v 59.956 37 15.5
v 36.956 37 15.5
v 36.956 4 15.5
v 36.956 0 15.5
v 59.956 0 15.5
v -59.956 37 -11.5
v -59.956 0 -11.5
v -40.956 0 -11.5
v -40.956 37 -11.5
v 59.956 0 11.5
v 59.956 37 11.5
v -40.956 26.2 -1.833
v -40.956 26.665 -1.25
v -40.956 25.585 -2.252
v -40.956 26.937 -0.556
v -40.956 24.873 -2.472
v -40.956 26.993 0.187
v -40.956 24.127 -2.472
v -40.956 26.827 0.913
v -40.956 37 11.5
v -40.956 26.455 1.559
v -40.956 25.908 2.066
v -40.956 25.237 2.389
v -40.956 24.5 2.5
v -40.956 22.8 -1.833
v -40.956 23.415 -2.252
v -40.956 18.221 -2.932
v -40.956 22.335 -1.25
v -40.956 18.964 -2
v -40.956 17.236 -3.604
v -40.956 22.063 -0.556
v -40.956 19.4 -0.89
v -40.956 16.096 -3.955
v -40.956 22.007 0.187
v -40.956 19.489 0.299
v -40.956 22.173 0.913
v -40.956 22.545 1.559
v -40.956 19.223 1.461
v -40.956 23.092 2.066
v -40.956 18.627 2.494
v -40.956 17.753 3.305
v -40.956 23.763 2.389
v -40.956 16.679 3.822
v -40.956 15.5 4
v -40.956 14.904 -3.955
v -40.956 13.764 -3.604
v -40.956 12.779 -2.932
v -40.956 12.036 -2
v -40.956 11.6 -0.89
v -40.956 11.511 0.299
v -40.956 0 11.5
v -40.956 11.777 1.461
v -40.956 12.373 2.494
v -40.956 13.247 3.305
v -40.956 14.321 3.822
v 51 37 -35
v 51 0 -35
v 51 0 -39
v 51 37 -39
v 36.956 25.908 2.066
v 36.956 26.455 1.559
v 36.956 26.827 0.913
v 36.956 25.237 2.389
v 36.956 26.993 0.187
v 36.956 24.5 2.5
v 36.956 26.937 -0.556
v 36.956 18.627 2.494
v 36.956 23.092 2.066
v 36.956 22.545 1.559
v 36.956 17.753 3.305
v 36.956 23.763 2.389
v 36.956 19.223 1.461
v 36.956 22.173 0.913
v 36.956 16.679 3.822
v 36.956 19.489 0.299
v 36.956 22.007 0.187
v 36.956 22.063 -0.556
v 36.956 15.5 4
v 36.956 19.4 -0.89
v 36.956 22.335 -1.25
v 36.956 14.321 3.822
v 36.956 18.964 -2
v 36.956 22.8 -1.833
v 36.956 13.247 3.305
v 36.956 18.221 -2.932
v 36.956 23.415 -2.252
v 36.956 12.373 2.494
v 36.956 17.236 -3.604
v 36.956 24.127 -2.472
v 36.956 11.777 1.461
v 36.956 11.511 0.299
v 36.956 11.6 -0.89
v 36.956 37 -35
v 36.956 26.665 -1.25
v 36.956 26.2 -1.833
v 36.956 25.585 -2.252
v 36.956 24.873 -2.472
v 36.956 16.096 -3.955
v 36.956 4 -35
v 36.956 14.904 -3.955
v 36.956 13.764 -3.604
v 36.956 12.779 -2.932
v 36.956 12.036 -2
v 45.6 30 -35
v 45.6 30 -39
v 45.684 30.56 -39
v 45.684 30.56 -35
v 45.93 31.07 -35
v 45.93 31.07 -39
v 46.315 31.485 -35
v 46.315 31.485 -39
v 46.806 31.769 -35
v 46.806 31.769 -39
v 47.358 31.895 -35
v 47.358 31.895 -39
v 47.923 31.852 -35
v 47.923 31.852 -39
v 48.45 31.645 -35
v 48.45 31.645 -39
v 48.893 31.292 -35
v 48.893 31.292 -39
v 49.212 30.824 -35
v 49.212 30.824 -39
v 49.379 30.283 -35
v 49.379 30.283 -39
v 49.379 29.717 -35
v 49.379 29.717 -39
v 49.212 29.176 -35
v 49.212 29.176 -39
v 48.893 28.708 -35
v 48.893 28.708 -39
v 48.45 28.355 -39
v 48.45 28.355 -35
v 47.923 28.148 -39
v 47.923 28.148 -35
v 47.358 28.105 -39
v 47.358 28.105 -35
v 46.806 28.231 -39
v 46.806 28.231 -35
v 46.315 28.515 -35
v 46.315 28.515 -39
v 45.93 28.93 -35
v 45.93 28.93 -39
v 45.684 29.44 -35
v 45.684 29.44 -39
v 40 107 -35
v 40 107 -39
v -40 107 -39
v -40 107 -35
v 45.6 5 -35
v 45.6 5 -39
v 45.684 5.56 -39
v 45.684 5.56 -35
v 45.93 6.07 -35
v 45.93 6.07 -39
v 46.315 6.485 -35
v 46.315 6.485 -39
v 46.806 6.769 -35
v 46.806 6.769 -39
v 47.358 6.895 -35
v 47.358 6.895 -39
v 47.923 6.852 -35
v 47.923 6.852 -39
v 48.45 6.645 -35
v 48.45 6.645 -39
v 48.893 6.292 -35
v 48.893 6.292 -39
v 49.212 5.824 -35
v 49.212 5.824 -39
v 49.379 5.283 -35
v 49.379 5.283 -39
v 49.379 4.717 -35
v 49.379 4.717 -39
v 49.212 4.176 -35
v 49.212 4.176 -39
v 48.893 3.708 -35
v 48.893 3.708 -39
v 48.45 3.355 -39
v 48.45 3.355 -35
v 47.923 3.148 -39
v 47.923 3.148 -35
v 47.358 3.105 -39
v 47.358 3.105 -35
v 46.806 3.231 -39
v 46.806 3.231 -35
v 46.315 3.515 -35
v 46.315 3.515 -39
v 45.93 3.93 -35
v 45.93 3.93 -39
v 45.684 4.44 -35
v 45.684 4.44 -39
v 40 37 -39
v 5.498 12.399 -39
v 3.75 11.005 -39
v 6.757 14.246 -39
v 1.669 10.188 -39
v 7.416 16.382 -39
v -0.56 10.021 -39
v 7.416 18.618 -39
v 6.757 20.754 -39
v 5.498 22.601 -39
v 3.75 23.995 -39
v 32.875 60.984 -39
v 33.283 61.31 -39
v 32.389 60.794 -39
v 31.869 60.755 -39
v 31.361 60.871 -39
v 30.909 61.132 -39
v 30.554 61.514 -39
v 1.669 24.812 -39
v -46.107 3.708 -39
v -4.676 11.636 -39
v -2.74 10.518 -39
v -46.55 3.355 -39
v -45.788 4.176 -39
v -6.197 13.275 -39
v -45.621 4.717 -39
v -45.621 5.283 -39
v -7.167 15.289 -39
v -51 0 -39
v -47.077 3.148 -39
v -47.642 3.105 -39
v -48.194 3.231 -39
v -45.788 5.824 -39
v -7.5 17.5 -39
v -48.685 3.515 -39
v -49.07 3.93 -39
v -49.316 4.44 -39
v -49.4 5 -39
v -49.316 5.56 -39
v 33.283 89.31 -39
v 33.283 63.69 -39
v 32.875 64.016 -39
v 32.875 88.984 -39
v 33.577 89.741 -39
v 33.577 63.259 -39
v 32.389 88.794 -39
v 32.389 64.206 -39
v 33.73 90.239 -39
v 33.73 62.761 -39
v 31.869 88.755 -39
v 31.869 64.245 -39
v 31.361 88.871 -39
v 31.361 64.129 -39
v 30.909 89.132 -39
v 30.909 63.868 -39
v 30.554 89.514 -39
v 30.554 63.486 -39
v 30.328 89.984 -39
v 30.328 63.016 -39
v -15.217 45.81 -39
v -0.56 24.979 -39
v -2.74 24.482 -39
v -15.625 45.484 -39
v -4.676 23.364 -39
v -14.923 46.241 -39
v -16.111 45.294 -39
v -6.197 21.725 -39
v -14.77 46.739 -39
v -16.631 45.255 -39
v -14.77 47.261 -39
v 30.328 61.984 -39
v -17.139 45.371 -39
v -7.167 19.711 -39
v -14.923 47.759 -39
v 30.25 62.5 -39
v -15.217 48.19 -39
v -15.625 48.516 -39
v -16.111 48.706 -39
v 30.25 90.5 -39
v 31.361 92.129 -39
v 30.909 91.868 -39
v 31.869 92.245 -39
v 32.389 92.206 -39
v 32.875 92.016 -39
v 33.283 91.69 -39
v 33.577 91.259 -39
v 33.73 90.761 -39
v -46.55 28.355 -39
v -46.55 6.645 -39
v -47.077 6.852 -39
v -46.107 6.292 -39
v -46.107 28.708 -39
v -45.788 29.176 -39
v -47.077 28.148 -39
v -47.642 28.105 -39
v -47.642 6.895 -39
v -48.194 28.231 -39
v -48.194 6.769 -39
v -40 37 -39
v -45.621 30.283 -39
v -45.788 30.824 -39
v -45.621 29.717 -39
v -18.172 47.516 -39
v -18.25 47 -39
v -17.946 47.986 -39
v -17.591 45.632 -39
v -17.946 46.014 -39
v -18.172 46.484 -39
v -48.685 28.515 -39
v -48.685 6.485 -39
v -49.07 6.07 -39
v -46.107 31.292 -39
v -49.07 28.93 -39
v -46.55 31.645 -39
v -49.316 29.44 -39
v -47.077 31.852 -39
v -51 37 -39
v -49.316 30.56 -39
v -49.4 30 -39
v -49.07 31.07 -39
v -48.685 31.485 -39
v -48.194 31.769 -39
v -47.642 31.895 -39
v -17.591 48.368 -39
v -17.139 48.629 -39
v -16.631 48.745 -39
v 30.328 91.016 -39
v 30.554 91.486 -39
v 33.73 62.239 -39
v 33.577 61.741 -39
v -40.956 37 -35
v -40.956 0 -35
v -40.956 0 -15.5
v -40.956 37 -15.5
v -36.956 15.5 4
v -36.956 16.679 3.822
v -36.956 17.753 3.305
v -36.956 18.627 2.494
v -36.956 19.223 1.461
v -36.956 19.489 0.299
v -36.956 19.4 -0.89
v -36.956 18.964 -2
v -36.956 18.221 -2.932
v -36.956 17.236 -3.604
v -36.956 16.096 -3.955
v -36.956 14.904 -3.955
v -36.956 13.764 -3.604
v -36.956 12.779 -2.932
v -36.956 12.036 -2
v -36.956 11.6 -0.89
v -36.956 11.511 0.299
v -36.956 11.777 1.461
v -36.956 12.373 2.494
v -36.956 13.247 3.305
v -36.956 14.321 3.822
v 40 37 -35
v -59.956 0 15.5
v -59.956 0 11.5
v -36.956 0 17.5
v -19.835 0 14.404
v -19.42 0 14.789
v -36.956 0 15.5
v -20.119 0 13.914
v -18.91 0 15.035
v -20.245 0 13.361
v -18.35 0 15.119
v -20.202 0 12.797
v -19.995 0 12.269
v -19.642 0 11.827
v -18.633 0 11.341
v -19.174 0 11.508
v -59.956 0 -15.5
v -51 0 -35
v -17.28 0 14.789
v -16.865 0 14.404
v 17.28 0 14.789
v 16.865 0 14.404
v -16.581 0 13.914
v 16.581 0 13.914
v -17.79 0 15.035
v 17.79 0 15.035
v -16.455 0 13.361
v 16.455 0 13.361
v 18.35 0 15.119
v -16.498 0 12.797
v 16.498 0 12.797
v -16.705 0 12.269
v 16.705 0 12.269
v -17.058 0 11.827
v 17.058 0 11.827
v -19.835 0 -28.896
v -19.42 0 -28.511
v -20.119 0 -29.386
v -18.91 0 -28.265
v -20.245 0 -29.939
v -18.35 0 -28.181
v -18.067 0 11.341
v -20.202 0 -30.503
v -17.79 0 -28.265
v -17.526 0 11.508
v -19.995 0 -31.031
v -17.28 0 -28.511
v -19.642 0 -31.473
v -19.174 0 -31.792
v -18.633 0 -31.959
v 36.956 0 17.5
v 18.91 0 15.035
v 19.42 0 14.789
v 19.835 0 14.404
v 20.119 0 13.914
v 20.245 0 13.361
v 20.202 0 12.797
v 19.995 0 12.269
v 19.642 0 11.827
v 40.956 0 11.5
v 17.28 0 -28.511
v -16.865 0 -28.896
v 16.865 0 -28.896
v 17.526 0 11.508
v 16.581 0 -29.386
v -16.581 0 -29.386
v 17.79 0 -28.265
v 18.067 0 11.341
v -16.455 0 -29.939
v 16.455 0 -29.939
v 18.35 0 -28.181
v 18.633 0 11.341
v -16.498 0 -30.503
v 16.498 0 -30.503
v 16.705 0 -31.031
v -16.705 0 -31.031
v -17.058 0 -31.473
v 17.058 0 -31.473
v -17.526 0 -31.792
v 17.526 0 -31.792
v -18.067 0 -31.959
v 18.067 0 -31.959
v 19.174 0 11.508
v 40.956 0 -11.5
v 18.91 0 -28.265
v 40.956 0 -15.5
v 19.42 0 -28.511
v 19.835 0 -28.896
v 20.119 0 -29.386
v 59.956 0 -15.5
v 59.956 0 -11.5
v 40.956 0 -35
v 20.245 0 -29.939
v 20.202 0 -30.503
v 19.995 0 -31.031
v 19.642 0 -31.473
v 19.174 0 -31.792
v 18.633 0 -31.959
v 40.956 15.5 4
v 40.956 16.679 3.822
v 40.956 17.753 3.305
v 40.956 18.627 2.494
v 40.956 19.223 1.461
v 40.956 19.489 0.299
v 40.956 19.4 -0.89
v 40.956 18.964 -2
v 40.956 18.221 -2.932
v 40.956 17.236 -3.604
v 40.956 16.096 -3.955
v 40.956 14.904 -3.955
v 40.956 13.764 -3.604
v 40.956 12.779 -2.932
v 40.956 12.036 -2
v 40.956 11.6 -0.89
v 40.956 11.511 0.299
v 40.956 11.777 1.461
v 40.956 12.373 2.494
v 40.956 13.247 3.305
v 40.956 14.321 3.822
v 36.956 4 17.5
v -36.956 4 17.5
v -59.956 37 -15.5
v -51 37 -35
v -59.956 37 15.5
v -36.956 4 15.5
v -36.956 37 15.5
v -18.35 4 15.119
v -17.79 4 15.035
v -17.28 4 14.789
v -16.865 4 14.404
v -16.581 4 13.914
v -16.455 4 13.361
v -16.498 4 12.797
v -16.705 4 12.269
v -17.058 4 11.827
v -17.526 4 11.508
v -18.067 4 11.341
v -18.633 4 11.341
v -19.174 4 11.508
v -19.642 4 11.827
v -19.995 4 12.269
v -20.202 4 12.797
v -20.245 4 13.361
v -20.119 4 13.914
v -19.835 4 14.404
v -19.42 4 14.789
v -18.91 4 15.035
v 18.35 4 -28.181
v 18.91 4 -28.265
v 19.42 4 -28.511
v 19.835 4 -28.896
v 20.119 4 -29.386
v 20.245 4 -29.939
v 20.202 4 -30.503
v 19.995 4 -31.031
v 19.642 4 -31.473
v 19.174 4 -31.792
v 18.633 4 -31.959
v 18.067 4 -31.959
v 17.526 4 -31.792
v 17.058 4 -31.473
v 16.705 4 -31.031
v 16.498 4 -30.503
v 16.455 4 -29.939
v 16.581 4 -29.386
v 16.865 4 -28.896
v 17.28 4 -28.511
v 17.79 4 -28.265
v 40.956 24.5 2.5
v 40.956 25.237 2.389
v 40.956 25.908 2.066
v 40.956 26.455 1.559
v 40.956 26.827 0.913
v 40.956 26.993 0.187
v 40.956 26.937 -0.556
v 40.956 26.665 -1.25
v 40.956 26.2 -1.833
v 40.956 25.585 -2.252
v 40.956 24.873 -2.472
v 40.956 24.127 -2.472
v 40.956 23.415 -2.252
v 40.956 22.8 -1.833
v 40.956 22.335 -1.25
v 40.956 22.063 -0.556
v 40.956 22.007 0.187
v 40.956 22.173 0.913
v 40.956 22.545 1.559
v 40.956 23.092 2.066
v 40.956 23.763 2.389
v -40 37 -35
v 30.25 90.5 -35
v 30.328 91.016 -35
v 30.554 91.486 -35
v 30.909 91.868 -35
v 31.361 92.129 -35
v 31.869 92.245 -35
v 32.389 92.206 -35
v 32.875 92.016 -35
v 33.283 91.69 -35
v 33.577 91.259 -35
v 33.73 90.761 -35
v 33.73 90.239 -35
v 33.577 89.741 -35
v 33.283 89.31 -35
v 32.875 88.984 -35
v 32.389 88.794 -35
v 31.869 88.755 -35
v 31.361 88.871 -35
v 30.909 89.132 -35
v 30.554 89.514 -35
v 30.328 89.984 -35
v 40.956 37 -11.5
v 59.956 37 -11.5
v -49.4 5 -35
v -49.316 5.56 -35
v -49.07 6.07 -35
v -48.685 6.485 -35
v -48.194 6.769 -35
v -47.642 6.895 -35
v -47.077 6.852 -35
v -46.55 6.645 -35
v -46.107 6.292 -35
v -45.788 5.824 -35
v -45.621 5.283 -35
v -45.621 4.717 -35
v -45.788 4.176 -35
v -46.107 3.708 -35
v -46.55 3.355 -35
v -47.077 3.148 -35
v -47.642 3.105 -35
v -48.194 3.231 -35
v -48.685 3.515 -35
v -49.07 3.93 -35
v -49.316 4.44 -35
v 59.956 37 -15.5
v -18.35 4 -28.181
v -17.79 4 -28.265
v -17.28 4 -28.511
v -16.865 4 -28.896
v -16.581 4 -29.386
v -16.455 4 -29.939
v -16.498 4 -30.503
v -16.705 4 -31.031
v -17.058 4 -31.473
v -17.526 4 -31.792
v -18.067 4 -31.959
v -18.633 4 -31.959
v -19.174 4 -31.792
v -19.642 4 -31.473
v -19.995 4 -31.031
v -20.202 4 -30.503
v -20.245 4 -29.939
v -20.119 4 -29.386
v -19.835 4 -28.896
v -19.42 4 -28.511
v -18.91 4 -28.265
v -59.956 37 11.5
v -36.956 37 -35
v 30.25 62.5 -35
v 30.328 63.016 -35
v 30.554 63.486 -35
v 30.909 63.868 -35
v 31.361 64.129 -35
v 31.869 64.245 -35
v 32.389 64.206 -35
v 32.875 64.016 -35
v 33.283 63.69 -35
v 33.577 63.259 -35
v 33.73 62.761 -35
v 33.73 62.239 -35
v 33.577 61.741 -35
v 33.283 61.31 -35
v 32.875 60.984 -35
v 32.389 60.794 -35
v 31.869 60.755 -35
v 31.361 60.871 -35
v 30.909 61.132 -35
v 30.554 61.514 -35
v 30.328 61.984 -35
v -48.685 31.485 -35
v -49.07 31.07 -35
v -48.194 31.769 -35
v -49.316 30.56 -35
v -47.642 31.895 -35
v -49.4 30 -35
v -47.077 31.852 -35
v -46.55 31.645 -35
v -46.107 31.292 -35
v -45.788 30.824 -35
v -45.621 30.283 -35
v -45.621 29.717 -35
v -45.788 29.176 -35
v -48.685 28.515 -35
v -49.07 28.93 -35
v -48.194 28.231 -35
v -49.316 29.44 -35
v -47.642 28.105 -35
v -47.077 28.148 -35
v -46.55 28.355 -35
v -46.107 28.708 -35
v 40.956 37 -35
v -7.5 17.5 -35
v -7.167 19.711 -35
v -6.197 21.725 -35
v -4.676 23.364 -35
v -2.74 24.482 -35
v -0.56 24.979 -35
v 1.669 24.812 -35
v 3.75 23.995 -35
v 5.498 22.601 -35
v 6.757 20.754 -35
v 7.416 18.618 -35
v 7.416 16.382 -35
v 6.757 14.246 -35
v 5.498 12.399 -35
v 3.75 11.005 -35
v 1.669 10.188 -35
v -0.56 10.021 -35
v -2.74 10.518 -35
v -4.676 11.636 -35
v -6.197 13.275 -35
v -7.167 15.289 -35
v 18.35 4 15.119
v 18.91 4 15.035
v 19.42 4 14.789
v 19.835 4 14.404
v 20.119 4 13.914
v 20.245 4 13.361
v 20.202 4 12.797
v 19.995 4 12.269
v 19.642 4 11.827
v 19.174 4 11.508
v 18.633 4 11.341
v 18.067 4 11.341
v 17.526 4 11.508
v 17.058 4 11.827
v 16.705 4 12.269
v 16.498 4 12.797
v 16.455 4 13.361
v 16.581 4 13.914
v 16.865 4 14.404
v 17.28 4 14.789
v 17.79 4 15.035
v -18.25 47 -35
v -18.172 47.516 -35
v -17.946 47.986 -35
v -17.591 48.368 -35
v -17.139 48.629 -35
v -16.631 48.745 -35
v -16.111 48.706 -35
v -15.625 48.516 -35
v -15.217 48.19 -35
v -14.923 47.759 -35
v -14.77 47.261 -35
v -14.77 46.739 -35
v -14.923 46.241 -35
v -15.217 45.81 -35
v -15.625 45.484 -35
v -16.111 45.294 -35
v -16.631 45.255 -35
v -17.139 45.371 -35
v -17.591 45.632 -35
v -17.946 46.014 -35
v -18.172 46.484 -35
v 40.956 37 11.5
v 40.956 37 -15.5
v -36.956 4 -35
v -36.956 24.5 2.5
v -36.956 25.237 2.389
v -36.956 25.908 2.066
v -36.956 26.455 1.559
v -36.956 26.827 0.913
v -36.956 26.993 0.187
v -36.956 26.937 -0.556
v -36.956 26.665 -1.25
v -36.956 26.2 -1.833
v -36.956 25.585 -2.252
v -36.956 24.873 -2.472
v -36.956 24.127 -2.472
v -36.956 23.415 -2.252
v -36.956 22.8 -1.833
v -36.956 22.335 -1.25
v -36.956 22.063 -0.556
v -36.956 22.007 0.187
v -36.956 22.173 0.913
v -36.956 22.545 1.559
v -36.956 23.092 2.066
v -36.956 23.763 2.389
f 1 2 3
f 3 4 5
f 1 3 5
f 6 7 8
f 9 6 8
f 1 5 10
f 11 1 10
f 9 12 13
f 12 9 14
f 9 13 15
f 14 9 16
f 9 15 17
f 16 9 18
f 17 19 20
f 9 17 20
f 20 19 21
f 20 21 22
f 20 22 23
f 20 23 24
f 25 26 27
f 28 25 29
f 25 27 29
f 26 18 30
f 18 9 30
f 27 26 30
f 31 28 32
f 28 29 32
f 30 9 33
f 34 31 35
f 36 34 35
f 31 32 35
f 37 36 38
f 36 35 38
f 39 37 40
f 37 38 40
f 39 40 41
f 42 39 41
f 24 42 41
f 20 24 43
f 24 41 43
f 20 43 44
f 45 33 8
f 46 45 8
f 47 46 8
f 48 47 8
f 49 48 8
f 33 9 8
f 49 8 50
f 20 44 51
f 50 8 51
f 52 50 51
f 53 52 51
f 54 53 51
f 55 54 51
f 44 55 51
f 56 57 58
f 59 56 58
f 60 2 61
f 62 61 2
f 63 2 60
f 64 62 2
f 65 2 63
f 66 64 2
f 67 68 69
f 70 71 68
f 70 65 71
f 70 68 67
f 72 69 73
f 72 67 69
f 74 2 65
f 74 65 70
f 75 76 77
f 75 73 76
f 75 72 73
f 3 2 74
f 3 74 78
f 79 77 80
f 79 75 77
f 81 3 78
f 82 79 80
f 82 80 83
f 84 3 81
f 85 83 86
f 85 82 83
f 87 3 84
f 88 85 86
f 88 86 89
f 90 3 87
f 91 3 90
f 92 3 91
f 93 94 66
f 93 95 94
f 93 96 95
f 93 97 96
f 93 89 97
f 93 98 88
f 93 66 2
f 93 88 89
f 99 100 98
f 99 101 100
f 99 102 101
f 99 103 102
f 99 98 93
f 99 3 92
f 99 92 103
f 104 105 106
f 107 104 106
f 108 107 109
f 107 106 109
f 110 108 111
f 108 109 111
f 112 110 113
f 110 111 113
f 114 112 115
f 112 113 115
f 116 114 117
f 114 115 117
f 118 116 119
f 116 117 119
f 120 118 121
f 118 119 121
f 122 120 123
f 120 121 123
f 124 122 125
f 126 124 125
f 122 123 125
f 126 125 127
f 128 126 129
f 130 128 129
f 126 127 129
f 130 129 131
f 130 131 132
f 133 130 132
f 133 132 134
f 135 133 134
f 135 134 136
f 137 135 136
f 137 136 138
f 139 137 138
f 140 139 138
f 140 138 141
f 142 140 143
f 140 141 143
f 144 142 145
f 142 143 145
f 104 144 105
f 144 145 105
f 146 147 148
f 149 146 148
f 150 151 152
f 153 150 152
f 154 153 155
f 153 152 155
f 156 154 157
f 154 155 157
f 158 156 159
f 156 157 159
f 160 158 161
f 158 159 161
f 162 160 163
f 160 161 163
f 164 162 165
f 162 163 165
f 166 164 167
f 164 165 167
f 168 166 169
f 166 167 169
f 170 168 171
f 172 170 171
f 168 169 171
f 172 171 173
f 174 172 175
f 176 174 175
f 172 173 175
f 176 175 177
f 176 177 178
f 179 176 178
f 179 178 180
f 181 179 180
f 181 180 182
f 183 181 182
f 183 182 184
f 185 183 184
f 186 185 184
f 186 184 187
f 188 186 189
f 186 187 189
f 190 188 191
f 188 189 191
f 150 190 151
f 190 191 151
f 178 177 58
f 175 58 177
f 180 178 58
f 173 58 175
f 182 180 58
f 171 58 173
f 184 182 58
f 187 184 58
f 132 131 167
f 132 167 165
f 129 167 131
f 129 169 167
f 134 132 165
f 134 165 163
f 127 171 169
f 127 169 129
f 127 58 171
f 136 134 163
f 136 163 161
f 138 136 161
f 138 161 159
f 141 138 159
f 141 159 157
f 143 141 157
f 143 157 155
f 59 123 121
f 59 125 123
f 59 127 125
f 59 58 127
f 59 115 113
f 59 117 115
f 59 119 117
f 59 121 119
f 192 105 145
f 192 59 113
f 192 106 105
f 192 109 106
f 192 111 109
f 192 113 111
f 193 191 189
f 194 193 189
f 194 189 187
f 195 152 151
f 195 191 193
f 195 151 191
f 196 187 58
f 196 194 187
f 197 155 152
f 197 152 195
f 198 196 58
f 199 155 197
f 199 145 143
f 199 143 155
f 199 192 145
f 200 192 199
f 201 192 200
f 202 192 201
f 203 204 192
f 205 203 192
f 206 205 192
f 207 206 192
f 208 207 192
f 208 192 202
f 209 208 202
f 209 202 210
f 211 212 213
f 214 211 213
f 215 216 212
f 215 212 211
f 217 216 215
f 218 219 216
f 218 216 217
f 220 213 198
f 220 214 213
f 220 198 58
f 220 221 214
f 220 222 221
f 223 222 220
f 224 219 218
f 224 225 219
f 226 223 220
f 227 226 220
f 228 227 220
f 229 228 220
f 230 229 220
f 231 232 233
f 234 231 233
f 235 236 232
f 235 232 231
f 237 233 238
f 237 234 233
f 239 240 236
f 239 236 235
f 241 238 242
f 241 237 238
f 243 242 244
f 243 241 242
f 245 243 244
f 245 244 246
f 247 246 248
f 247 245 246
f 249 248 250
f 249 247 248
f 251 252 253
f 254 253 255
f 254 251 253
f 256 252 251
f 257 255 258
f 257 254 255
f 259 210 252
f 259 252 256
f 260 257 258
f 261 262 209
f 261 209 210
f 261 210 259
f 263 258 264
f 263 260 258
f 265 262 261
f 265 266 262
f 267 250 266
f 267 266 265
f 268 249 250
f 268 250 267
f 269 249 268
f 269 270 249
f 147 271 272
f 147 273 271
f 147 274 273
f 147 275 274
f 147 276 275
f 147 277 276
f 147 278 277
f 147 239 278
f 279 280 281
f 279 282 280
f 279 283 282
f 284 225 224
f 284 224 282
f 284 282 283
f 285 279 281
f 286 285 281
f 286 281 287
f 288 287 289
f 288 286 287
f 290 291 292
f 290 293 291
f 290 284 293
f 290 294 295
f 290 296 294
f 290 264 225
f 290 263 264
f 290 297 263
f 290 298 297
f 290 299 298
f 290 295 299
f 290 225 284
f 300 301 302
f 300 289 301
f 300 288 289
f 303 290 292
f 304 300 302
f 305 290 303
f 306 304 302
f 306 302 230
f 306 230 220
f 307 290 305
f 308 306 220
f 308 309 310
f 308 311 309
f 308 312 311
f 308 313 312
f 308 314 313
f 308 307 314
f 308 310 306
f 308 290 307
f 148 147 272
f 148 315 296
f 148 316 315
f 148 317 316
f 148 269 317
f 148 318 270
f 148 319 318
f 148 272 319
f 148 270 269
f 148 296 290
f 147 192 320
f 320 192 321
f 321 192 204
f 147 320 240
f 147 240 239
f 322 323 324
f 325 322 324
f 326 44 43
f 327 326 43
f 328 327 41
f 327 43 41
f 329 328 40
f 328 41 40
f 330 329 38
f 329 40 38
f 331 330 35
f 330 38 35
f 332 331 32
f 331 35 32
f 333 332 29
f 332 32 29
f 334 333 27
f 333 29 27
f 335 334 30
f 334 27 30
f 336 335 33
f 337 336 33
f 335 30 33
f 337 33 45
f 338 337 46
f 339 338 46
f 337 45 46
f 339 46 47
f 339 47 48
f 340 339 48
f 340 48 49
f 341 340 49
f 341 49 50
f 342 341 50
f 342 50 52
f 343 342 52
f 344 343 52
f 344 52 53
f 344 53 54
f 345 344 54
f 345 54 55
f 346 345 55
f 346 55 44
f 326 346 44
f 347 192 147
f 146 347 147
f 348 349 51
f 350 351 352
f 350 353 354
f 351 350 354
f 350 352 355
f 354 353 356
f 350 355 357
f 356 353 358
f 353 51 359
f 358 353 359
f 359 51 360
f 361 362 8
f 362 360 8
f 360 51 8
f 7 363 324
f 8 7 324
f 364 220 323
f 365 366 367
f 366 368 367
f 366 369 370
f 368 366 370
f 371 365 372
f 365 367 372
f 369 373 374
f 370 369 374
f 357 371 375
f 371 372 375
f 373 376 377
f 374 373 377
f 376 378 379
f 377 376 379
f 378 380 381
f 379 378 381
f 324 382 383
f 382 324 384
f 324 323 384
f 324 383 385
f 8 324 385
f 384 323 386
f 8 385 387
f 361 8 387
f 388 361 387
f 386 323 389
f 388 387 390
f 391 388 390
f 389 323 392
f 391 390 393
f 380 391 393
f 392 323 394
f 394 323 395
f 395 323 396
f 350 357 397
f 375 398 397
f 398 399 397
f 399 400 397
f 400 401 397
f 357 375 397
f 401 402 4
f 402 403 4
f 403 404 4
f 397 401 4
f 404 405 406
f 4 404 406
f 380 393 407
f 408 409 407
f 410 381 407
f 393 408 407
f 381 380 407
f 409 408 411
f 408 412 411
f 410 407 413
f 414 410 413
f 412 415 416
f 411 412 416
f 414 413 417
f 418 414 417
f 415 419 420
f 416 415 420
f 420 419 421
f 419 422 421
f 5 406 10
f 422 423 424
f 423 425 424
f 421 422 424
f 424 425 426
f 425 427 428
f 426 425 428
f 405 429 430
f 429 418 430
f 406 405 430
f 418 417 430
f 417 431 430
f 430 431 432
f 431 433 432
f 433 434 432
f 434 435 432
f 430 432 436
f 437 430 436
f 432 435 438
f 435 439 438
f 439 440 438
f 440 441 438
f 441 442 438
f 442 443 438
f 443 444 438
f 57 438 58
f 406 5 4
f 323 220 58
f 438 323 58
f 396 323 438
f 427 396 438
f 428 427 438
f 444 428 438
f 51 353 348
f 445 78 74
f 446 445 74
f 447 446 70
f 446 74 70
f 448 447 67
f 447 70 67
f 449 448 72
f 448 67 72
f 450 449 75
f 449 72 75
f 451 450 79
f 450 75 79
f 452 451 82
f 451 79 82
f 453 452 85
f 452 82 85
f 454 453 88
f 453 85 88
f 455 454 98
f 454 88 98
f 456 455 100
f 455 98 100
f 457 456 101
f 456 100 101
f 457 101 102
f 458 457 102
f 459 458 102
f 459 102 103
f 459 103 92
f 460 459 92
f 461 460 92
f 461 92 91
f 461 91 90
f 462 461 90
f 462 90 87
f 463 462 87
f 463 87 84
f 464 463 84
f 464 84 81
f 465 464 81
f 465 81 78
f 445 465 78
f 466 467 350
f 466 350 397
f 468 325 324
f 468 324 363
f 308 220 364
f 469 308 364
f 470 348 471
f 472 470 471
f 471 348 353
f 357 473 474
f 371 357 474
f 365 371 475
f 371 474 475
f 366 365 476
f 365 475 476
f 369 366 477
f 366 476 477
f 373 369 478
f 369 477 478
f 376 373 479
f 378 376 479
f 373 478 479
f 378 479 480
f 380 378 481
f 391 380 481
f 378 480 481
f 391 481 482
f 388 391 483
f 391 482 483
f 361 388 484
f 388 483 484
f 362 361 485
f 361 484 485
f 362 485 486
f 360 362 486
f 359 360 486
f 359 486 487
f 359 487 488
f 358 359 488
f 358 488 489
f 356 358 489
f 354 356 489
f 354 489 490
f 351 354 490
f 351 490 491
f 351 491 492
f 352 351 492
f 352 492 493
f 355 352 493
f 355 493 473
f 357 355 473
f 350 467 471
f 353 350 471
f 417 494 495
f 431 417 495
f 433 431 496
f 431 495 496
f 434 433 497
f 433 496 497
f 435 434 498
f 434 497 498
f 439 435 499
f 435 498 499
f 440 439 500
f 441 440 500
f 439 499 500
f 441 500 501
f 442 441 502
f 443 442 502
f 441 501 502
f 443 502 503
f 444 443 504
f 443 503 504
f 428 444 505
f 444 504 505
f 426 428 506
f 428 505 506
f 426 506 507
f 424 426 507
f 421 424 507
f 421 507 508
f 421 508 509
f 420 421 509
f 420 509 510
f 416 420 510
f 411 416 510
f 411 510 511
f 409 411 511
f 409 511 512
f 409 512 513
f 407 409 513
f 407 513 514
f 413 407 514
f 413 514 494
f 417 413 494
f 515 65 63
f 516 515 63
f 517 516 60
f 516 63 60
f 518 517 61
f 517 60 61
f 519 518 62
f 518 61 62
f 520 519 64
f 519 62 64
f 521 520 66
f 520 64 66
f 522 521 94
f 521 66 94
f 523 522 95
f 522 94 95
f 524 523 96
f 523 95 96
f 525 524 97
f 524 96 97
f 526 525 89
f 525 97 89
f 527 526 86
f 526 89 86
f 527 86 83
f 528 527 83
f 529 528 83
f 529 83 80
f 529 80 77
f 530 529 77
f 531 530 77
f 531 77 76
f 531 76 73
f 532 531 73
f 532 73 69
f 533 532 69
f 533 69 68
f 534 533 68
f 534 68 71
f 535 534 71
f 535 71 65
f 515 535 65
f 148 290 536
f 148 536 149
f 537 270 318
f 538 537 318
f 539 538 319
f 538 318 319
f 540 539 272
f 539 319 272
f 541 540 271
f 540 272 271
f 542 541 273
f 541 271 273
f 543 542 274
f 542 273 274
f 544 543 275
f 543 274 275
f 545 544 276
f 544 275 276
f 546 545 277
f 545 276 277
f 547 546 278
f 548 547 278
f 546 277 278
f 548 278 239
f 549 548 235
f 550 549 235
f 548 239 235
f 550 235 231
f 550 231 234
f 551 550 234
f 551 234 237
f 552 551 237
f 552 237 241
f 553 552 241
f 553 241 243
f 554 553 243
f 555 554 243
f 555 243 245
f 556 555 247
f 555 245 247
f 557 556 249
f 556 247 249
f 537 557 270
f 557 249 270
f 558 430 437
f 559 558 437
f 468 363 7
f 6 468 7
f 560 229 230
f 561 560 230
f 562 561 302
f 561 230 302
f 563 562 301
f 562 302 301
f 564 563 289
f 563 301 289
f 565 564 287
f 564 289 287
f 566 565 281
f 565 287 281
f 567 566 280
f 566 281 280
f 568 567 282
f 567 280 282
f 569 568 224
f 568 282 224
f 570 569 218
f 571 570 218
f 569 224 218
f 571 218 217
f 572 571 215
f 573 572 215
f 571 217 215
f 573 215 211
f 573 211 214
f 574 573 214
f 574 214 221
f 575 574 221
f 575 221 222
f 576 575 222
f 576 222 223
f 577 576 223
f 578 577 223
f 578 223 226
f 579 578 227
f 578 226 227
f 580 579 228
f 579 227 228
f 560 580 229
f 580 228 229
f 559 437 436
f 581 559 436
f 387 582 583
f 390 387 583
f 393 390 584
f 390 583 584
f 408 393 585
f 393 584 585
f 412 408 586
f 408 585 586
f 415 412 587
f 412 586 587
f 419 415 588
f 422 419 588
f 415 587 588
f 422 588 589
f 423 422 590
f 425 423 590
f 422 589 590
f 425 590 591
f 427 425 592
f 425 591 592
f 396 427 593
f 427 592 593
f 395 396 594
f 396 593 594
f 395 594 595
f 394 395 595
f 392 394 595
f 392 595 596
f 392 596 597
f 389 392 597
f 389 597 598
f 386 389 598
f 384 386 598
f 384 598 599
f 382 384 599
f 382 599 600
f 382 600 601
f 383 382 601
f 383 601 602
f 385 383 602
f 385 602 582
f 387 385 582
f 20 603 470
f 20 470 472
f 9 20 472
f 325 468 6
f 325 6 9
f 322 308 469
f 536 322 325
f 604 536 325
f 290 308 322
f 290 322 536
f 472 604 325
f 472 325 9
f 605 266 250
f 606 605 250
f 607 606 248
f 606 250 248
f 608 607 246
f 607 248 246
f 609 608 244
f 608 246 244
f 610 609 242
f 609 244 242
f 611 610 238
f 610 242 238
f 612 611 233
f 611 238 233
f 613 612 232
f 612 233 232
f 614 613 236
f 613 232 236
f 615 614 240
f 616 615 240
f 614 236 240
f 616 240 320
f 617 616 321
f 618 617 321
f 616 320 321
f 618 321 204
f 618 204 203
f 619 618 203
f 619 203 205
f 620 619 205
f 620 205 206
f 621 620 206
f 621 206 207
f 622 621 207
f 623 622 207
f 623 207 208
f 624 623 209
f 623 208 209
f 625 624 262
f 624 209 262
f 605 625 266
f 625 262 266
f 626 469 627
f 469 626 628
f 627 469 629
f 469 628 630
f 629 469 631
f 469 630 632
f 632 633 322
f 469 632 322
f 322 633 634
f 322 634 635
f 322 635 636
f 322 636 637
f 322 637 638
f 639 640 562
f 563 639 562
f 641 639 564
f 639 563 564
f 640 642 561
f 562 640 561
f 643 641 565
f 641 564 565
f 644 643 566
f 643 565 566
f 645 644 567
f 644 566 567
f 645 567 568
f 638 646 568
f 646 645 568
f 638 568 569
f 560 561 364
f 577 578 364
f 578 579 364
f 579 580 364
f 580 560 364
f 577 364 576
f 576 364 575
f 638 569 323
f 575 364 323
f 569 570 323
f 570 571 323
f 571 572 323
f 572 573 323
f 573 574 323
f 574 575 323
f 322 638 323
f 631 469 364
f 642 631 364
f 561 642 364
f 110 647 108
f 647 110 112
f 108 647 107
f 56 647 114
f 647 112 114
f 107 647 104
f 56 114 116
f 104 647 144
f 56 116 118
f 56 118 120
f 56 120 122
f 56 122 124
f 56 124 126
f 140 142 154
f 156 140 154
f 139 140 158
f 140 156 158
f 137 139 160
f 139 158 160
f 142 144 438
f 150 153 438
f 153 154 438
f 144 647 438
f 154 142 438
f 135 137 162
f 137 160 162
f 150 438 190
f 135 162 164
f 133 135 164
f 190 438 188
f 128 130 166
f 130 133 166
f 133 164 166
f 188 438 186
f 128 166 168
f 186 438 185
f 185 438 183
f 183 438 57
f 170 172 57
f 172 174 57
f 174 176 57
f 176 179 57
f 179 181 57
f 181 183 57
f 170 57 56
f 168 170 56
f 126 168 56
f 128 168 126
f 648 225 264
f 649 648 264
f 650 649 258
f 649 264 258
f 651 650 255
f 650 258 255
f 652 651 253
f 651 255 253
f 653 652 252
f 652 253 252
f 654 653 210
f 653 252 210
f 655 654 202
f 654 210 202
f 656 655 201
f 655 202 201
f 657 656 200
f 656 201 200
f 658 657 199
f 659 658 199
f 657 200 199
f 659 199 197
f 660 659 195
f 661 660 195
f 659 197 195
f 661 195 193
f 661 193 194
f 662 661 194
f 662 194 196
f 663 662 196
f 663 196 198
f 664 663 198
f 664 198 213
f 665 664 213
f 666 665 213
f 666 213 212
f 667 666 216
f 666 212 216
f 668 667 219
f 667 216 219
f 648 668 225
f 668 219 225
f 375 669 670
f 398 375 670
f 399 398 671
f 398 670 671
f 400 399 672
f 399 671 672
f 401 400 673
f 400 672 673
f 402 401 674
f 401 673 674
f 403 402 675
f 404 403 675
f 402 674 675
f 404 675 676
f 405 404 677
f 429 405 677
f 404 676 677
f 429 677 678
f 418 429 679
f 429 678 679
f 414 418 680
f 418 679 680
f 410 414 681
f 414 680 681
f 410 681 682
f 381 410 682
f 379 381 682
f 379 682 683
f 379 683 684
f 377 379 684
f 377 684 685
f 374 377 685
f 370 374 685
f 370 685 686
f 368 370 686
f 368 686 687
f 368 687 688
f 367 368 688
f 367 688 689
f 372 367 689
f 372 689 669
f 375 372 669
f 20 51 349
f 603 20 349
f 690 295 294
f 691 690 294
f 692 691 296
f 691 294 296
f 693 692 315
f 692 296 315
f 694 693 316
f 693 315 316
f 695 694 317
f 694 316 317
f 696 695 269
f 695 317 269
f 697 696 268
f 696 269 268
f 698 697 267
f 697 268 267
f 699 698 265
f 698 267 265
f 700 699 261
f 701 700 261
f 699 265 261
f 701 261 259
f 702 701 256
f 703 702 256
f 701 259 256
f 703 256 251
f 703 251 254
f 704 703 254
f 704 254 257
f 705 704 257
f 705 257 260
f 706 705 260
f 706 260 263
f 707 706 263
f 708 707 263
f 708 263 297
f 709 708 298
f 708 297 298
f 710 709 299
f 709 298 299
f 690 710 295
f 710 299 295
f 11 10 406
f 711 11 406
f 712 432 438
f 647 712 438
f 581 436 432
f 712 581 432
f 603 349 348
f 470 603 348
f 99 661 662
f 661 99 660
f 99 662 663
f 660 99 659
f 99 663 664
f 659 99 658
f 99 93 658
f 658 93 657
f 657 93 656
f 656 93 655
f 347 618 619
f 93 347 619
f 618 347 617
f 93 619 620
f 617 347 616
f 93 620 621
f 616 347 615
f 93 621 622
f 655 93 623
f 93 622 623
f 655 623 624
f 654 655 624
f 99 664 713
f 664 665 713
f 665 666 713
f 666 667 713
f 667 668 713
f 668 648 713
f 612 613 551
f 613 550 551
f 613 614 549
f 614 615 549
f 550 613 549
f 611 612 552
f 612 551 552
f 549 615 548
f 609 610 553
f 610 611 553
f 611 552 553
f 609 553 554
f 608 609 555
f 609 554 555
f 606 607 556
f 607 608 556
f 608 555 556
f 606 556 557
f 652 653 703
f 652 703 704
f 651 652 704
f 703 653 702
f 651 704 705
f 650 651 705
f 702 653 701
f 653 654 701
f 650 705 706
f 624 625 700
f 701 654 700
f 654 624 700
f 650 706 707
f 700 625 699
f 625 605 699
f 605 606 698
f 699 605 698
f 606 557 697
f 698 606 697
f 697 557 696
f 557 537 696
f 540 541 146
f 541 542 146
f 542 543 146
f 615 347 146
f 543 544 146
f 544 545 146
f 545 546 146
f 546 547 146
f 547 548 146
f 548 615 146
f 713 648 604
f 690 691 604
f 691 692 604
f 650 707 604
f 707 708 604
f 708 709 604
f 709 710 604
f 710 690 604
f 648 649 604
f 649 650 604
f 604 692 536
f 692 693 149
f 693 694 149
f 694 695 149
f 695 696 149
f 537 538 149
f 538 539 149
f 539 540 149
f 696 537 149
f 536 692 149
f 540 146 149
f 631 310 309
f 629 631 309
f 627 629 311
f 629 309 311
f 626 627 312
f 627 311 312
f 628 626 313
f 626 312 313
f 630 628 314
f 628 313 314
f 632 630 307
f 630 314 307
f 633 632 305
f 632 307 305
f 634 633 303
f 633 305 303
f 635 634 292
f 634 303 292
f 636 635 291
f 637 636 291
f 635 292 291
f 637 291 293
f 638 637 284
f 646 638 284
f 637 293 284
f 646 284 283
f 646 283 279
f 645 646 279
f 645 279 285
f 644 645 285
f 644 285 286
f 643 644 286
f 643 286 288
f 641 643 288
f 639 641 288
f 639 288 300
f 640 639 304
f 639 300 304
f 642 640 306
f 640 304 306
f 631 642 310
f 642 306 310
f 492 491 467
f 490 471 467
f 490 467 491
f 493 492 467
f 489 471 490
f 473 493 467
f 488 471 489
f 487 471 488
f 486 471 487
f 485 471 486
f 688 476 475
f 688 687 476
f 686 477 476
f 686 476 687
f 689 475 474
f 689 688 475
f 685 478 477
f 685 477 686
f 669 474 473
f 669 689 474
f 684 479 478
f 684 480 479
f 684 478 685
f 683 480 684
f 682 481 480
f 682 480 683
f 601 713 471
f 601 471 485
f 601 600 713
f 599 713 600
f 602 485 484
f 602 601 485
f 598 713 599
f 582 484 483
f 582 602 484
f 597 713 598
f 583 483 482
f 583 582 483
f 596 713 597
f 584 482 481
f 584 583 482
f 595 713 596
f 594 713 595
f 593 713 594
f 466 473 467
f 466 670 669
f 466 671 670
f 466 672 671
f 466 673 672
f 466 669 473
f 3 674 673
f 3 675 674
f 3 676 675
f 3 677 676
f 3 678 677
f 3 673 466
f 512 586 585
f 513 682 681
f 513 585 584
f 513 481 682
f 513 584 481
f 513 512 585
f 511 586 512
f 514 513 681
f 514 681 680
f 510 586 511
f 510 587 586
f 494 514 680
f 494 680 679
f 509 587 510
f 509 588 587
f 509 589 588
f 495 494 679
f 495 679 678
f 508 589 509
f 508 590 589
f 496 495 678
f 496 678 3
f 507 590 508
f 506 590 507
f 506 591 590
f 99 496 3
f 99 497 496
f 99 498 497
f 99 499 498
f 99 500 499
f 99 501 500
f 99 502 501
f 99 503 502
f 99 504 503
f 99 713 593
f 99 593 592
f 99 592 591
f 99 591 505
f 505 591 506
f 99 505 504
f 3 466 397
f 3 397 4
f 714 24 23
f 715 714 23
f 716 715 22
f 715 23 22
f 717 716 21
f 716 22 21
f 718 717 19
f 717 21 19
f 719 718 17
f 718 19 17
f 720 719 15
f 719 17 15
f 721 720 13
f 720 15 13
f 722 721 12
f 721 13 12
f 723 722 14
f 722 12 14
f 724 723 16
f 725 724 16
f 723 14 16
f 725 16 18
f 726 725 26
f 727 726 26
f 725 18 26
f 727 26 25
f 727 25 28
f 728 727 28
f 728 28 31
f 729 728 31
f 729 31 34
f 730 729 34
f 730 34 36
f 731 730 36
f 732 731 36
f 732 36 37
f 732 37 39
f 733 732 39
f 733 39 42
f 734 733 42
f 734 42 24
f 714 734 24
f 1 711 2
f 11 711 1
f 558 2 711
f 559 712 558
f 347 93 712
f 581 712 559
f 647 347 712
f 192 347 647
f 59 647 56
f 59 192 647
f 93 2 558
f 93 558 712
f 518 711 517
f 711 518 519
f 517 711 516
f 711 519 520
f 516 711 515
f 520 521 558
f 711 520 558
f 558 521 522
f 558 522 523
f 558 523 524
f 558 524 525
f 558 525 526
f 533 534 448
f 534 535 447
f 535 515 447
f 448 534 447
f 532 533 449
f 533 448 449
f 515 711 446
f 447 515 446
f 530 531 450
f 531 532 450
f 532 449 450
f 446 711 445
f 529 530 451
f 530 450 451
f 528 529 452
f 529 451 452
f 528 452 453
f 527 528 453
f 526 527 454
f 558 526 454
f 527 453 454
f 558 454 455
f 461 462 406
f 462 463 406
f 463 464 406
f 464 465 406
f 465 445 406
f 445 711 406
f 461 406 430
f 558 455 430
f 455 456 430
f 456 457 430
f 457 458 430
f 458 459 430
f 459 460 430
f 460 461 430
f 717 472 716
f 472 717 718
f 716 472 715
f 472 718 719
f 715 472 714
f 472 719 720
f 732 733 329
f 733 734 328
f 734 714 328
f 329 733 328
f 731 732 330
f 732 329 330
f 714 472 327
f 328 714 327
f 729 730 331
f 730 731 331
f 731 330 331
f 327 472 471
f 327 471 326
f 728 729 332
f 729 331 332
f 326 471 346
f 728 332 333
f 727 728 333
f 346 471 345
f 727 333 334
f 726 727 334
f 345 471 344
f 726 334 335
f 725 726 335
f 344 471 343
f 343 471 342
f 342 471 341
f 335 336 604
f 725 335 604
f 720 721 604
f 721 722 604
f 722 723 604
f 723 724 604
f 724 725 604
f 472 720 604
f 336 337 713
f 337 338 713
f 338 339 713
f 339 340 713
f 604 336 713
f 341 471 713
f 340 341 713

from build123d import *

# Parameters (mm, degrees)
BOSS_EXTRUDE1_DEPTH = 4
BOSS_EXTRUDE2_START = -4
BOSS_EXTRUDE2_DEPTH = 37
SKETCH3_R           = 4
SKETCH3_R_2         = 2.5
CUT_EXTRUDE1_DEPTH  = 109.592312231
SKETCH4_W           = 73.911051306
SKETCH4_H           = 52.5
BOSS_EXTRUDE3_DEPTH = 4
SKETCH5_R           = 1.9
CUT_EXTRUDE2_DEPTH  = 37
BOSS_EXTRUDE4_START = -4
BOSS_EXTRUDE4_DEPTH = 37
SKETCH7_R           = 1.9
SKETCH7_R_2         = 7.5
CUT_EXTRUDE4_DEPTH  = 4
SKETCH8_W           = 80
SKETCH8_H           = 70
SKETCH8_R           = 1.75
BOSS_EXTRUDE5_DEPTH = 4


with BuildPart() as part:
    # Sketch1 → Boss-Extrude1 (new body)
    with BuildSketch(Plane(origin=(0, 0, 0), x_dir=(1, 0, 0), z_dir=(0, 1, 0))):
        Polygon((40.955525653, 11.5), (59.955525653, 11.5), (59.955525653, 15.5), (-59.955525653, 15.5), (-59.955525653, 11.5), (-40.955525653, 11.5), (-40.955525653, -11.5), (-59.955525653, -11.5), (-59.955525653, -15.5), (59.955525653, -15.5), (59.955525653, -11.5), (40.955525653, -11.5), align=None)
    extrude(amount=BOSS_EXTRUDE1_DEPTH)

    # Sketch2 → Boss-Extrude2 (add)
    with BuildSketch(Plane(origin=(0, 4, 0), x_dir=(1, 0, 0), z_dir=(0, 1, 0)).offset(BOSS_EXTRUDE2_START)):
        Polygon((-36.955525653, 15.5), (-59.955525653, 15.5), (-59.955525653, 11.5), (-40.955525653, 11.5), (-40.955525653, -11.5), (-59.955525653, -11.5), (-59.955525653, -15.5), (-36.955525653, -15.5), align=None)
        Polygon((36.955525653, -15.5), (36.955525653, 15.5), (59.955525653, 15.5), (59.955525653, 11.5), (40.955525653, 11.5), (40.955525653, -11.5), (59.955525653, -11.5), (59.955525653, -15.5), align=None)
    extrude(amount=BOSS_EXTRUDE2_DEPTH)

    # Sketch3 → Cut-Extrude1 (cut, through all)
    with BuildSketch(Plane.ZY.offset(40.955525653)):
        with Locations((0, 15.5)):
            Circle(SKETCH3_R)
        with Locations((0, 24.5)):
            Circle(SKETCH3_R_2)
    extrude(amount=-CUT_EXTRUDE1_DEPTH, mode=Mode.SUBTRACT)

    # Sketch4 → Boss-Extrude3 (add)
    with BuildSketch(Plane(origin=(0, 4, 0), x_dir=(1, 0, 0), z_dir=(0, 1, 0))):
        with Locations((0, 8.75)):
            Rectangle(SKETCH4_W, SKETCH4_H)
    extrude(amount=-BOSS_EXTRUDE3_DEPTH)

    # Sketch5 → Cut-Extrude2 (cut)
    with BuildSketch(Plane(origin=(0, 4, 0), x_dir=(1, 0, 0), z_dir=(0, 1, 0))):
        with Locations(Location((-18.35, 30.080617362, 0), (0, 0, 270))):
            Circle(SKETCH5_R)
        with Locations(Location((18.35, 30.080617362, 0), (0, 0, 270))):
            Circle(SKETCH5_R)
        with Locations(Location((18.35, -13.219382638, 0), (0, 0, 270))):
            Circle(SKETCH5_R)
        with Locations(Location((-18.35, -13.219382638, 0), (0, 0, 270))):
            Circle(SKETCH5_R)
    extrude(amount=-CUT_EXTRUDE2_DEPTH, mode=Mode.SUBTRACT)

    # Sketch6 → Boss-Extrude4 (add)
    with BuildSketch(Plane(origin=(0, 4, 0), x_dir=(1, 0, 0), z_dir=(0, 1, 0)).offset(BOSS_EXTRUDE4_START)):
        Polygon((-36.955525653, 15.5), (-36.955525653, 35), (36.955525653, 35), (36.955525653, 15.5), (40.955525653, 15.5), (40.955525653, 35), (51, 35), (51, 39), (-51, 39), (-51, 35), (-40.955525653, 35), (-40.955525653, 15.5), align=None)
    extrude(amount=BOSS_EXTRUDE4_DEPTH)

    # Sketch7 → Cut-Extrude4 (cut)
    with BuildSketch(Plane(origin=(0, 0, -39), x_dir=(-1, 0, 0), z_dir=(0, 0, -1))):
        with Locations((-47.5, 30)):
            Circle(SKETCH7_R)
        with Locations((47.5, 30)):
            Circle(SKETCH7_R)
        with Locations((47.5, 5)):
            Circle(SKETCH7_R)
        with Locations((-47.5, 5)):
            Circle(SKETCH7_R)
        with Locations((0, 17.5)):
            Circle(SKETCH7_R_2)
    extrude(amount=-CUT_EXTRUDE4_DEPTH, mode=Mode.SUBTRACT)

    # Sketch8 → Boss-Extrude5 (add)
    with BuildSketch(Plane(origin=(0, 0, -39), x_dir=(-1, 0, 0), z_dir=(0, 0, -1))):
        with Locations((0, 72)):
            Rectangle(SKETCH8_W, SKETCH8_H)
        with Locations((-32, 90.5)):
            Circle(SKETCH8_R, mode=Mode.SUBTRACT)
        with Locations((-32, 62.5)):
            Circle(SKETCH8_R, mode=Mode.SUBTRACT)
        with Locations((16.5, 47)):
            Circle(SKETCH8_R, mode=Mode.SUBTRACT)
    extrude(amount=-BOSS_EXTRUDE5_DEPTH)


solid = part.part
